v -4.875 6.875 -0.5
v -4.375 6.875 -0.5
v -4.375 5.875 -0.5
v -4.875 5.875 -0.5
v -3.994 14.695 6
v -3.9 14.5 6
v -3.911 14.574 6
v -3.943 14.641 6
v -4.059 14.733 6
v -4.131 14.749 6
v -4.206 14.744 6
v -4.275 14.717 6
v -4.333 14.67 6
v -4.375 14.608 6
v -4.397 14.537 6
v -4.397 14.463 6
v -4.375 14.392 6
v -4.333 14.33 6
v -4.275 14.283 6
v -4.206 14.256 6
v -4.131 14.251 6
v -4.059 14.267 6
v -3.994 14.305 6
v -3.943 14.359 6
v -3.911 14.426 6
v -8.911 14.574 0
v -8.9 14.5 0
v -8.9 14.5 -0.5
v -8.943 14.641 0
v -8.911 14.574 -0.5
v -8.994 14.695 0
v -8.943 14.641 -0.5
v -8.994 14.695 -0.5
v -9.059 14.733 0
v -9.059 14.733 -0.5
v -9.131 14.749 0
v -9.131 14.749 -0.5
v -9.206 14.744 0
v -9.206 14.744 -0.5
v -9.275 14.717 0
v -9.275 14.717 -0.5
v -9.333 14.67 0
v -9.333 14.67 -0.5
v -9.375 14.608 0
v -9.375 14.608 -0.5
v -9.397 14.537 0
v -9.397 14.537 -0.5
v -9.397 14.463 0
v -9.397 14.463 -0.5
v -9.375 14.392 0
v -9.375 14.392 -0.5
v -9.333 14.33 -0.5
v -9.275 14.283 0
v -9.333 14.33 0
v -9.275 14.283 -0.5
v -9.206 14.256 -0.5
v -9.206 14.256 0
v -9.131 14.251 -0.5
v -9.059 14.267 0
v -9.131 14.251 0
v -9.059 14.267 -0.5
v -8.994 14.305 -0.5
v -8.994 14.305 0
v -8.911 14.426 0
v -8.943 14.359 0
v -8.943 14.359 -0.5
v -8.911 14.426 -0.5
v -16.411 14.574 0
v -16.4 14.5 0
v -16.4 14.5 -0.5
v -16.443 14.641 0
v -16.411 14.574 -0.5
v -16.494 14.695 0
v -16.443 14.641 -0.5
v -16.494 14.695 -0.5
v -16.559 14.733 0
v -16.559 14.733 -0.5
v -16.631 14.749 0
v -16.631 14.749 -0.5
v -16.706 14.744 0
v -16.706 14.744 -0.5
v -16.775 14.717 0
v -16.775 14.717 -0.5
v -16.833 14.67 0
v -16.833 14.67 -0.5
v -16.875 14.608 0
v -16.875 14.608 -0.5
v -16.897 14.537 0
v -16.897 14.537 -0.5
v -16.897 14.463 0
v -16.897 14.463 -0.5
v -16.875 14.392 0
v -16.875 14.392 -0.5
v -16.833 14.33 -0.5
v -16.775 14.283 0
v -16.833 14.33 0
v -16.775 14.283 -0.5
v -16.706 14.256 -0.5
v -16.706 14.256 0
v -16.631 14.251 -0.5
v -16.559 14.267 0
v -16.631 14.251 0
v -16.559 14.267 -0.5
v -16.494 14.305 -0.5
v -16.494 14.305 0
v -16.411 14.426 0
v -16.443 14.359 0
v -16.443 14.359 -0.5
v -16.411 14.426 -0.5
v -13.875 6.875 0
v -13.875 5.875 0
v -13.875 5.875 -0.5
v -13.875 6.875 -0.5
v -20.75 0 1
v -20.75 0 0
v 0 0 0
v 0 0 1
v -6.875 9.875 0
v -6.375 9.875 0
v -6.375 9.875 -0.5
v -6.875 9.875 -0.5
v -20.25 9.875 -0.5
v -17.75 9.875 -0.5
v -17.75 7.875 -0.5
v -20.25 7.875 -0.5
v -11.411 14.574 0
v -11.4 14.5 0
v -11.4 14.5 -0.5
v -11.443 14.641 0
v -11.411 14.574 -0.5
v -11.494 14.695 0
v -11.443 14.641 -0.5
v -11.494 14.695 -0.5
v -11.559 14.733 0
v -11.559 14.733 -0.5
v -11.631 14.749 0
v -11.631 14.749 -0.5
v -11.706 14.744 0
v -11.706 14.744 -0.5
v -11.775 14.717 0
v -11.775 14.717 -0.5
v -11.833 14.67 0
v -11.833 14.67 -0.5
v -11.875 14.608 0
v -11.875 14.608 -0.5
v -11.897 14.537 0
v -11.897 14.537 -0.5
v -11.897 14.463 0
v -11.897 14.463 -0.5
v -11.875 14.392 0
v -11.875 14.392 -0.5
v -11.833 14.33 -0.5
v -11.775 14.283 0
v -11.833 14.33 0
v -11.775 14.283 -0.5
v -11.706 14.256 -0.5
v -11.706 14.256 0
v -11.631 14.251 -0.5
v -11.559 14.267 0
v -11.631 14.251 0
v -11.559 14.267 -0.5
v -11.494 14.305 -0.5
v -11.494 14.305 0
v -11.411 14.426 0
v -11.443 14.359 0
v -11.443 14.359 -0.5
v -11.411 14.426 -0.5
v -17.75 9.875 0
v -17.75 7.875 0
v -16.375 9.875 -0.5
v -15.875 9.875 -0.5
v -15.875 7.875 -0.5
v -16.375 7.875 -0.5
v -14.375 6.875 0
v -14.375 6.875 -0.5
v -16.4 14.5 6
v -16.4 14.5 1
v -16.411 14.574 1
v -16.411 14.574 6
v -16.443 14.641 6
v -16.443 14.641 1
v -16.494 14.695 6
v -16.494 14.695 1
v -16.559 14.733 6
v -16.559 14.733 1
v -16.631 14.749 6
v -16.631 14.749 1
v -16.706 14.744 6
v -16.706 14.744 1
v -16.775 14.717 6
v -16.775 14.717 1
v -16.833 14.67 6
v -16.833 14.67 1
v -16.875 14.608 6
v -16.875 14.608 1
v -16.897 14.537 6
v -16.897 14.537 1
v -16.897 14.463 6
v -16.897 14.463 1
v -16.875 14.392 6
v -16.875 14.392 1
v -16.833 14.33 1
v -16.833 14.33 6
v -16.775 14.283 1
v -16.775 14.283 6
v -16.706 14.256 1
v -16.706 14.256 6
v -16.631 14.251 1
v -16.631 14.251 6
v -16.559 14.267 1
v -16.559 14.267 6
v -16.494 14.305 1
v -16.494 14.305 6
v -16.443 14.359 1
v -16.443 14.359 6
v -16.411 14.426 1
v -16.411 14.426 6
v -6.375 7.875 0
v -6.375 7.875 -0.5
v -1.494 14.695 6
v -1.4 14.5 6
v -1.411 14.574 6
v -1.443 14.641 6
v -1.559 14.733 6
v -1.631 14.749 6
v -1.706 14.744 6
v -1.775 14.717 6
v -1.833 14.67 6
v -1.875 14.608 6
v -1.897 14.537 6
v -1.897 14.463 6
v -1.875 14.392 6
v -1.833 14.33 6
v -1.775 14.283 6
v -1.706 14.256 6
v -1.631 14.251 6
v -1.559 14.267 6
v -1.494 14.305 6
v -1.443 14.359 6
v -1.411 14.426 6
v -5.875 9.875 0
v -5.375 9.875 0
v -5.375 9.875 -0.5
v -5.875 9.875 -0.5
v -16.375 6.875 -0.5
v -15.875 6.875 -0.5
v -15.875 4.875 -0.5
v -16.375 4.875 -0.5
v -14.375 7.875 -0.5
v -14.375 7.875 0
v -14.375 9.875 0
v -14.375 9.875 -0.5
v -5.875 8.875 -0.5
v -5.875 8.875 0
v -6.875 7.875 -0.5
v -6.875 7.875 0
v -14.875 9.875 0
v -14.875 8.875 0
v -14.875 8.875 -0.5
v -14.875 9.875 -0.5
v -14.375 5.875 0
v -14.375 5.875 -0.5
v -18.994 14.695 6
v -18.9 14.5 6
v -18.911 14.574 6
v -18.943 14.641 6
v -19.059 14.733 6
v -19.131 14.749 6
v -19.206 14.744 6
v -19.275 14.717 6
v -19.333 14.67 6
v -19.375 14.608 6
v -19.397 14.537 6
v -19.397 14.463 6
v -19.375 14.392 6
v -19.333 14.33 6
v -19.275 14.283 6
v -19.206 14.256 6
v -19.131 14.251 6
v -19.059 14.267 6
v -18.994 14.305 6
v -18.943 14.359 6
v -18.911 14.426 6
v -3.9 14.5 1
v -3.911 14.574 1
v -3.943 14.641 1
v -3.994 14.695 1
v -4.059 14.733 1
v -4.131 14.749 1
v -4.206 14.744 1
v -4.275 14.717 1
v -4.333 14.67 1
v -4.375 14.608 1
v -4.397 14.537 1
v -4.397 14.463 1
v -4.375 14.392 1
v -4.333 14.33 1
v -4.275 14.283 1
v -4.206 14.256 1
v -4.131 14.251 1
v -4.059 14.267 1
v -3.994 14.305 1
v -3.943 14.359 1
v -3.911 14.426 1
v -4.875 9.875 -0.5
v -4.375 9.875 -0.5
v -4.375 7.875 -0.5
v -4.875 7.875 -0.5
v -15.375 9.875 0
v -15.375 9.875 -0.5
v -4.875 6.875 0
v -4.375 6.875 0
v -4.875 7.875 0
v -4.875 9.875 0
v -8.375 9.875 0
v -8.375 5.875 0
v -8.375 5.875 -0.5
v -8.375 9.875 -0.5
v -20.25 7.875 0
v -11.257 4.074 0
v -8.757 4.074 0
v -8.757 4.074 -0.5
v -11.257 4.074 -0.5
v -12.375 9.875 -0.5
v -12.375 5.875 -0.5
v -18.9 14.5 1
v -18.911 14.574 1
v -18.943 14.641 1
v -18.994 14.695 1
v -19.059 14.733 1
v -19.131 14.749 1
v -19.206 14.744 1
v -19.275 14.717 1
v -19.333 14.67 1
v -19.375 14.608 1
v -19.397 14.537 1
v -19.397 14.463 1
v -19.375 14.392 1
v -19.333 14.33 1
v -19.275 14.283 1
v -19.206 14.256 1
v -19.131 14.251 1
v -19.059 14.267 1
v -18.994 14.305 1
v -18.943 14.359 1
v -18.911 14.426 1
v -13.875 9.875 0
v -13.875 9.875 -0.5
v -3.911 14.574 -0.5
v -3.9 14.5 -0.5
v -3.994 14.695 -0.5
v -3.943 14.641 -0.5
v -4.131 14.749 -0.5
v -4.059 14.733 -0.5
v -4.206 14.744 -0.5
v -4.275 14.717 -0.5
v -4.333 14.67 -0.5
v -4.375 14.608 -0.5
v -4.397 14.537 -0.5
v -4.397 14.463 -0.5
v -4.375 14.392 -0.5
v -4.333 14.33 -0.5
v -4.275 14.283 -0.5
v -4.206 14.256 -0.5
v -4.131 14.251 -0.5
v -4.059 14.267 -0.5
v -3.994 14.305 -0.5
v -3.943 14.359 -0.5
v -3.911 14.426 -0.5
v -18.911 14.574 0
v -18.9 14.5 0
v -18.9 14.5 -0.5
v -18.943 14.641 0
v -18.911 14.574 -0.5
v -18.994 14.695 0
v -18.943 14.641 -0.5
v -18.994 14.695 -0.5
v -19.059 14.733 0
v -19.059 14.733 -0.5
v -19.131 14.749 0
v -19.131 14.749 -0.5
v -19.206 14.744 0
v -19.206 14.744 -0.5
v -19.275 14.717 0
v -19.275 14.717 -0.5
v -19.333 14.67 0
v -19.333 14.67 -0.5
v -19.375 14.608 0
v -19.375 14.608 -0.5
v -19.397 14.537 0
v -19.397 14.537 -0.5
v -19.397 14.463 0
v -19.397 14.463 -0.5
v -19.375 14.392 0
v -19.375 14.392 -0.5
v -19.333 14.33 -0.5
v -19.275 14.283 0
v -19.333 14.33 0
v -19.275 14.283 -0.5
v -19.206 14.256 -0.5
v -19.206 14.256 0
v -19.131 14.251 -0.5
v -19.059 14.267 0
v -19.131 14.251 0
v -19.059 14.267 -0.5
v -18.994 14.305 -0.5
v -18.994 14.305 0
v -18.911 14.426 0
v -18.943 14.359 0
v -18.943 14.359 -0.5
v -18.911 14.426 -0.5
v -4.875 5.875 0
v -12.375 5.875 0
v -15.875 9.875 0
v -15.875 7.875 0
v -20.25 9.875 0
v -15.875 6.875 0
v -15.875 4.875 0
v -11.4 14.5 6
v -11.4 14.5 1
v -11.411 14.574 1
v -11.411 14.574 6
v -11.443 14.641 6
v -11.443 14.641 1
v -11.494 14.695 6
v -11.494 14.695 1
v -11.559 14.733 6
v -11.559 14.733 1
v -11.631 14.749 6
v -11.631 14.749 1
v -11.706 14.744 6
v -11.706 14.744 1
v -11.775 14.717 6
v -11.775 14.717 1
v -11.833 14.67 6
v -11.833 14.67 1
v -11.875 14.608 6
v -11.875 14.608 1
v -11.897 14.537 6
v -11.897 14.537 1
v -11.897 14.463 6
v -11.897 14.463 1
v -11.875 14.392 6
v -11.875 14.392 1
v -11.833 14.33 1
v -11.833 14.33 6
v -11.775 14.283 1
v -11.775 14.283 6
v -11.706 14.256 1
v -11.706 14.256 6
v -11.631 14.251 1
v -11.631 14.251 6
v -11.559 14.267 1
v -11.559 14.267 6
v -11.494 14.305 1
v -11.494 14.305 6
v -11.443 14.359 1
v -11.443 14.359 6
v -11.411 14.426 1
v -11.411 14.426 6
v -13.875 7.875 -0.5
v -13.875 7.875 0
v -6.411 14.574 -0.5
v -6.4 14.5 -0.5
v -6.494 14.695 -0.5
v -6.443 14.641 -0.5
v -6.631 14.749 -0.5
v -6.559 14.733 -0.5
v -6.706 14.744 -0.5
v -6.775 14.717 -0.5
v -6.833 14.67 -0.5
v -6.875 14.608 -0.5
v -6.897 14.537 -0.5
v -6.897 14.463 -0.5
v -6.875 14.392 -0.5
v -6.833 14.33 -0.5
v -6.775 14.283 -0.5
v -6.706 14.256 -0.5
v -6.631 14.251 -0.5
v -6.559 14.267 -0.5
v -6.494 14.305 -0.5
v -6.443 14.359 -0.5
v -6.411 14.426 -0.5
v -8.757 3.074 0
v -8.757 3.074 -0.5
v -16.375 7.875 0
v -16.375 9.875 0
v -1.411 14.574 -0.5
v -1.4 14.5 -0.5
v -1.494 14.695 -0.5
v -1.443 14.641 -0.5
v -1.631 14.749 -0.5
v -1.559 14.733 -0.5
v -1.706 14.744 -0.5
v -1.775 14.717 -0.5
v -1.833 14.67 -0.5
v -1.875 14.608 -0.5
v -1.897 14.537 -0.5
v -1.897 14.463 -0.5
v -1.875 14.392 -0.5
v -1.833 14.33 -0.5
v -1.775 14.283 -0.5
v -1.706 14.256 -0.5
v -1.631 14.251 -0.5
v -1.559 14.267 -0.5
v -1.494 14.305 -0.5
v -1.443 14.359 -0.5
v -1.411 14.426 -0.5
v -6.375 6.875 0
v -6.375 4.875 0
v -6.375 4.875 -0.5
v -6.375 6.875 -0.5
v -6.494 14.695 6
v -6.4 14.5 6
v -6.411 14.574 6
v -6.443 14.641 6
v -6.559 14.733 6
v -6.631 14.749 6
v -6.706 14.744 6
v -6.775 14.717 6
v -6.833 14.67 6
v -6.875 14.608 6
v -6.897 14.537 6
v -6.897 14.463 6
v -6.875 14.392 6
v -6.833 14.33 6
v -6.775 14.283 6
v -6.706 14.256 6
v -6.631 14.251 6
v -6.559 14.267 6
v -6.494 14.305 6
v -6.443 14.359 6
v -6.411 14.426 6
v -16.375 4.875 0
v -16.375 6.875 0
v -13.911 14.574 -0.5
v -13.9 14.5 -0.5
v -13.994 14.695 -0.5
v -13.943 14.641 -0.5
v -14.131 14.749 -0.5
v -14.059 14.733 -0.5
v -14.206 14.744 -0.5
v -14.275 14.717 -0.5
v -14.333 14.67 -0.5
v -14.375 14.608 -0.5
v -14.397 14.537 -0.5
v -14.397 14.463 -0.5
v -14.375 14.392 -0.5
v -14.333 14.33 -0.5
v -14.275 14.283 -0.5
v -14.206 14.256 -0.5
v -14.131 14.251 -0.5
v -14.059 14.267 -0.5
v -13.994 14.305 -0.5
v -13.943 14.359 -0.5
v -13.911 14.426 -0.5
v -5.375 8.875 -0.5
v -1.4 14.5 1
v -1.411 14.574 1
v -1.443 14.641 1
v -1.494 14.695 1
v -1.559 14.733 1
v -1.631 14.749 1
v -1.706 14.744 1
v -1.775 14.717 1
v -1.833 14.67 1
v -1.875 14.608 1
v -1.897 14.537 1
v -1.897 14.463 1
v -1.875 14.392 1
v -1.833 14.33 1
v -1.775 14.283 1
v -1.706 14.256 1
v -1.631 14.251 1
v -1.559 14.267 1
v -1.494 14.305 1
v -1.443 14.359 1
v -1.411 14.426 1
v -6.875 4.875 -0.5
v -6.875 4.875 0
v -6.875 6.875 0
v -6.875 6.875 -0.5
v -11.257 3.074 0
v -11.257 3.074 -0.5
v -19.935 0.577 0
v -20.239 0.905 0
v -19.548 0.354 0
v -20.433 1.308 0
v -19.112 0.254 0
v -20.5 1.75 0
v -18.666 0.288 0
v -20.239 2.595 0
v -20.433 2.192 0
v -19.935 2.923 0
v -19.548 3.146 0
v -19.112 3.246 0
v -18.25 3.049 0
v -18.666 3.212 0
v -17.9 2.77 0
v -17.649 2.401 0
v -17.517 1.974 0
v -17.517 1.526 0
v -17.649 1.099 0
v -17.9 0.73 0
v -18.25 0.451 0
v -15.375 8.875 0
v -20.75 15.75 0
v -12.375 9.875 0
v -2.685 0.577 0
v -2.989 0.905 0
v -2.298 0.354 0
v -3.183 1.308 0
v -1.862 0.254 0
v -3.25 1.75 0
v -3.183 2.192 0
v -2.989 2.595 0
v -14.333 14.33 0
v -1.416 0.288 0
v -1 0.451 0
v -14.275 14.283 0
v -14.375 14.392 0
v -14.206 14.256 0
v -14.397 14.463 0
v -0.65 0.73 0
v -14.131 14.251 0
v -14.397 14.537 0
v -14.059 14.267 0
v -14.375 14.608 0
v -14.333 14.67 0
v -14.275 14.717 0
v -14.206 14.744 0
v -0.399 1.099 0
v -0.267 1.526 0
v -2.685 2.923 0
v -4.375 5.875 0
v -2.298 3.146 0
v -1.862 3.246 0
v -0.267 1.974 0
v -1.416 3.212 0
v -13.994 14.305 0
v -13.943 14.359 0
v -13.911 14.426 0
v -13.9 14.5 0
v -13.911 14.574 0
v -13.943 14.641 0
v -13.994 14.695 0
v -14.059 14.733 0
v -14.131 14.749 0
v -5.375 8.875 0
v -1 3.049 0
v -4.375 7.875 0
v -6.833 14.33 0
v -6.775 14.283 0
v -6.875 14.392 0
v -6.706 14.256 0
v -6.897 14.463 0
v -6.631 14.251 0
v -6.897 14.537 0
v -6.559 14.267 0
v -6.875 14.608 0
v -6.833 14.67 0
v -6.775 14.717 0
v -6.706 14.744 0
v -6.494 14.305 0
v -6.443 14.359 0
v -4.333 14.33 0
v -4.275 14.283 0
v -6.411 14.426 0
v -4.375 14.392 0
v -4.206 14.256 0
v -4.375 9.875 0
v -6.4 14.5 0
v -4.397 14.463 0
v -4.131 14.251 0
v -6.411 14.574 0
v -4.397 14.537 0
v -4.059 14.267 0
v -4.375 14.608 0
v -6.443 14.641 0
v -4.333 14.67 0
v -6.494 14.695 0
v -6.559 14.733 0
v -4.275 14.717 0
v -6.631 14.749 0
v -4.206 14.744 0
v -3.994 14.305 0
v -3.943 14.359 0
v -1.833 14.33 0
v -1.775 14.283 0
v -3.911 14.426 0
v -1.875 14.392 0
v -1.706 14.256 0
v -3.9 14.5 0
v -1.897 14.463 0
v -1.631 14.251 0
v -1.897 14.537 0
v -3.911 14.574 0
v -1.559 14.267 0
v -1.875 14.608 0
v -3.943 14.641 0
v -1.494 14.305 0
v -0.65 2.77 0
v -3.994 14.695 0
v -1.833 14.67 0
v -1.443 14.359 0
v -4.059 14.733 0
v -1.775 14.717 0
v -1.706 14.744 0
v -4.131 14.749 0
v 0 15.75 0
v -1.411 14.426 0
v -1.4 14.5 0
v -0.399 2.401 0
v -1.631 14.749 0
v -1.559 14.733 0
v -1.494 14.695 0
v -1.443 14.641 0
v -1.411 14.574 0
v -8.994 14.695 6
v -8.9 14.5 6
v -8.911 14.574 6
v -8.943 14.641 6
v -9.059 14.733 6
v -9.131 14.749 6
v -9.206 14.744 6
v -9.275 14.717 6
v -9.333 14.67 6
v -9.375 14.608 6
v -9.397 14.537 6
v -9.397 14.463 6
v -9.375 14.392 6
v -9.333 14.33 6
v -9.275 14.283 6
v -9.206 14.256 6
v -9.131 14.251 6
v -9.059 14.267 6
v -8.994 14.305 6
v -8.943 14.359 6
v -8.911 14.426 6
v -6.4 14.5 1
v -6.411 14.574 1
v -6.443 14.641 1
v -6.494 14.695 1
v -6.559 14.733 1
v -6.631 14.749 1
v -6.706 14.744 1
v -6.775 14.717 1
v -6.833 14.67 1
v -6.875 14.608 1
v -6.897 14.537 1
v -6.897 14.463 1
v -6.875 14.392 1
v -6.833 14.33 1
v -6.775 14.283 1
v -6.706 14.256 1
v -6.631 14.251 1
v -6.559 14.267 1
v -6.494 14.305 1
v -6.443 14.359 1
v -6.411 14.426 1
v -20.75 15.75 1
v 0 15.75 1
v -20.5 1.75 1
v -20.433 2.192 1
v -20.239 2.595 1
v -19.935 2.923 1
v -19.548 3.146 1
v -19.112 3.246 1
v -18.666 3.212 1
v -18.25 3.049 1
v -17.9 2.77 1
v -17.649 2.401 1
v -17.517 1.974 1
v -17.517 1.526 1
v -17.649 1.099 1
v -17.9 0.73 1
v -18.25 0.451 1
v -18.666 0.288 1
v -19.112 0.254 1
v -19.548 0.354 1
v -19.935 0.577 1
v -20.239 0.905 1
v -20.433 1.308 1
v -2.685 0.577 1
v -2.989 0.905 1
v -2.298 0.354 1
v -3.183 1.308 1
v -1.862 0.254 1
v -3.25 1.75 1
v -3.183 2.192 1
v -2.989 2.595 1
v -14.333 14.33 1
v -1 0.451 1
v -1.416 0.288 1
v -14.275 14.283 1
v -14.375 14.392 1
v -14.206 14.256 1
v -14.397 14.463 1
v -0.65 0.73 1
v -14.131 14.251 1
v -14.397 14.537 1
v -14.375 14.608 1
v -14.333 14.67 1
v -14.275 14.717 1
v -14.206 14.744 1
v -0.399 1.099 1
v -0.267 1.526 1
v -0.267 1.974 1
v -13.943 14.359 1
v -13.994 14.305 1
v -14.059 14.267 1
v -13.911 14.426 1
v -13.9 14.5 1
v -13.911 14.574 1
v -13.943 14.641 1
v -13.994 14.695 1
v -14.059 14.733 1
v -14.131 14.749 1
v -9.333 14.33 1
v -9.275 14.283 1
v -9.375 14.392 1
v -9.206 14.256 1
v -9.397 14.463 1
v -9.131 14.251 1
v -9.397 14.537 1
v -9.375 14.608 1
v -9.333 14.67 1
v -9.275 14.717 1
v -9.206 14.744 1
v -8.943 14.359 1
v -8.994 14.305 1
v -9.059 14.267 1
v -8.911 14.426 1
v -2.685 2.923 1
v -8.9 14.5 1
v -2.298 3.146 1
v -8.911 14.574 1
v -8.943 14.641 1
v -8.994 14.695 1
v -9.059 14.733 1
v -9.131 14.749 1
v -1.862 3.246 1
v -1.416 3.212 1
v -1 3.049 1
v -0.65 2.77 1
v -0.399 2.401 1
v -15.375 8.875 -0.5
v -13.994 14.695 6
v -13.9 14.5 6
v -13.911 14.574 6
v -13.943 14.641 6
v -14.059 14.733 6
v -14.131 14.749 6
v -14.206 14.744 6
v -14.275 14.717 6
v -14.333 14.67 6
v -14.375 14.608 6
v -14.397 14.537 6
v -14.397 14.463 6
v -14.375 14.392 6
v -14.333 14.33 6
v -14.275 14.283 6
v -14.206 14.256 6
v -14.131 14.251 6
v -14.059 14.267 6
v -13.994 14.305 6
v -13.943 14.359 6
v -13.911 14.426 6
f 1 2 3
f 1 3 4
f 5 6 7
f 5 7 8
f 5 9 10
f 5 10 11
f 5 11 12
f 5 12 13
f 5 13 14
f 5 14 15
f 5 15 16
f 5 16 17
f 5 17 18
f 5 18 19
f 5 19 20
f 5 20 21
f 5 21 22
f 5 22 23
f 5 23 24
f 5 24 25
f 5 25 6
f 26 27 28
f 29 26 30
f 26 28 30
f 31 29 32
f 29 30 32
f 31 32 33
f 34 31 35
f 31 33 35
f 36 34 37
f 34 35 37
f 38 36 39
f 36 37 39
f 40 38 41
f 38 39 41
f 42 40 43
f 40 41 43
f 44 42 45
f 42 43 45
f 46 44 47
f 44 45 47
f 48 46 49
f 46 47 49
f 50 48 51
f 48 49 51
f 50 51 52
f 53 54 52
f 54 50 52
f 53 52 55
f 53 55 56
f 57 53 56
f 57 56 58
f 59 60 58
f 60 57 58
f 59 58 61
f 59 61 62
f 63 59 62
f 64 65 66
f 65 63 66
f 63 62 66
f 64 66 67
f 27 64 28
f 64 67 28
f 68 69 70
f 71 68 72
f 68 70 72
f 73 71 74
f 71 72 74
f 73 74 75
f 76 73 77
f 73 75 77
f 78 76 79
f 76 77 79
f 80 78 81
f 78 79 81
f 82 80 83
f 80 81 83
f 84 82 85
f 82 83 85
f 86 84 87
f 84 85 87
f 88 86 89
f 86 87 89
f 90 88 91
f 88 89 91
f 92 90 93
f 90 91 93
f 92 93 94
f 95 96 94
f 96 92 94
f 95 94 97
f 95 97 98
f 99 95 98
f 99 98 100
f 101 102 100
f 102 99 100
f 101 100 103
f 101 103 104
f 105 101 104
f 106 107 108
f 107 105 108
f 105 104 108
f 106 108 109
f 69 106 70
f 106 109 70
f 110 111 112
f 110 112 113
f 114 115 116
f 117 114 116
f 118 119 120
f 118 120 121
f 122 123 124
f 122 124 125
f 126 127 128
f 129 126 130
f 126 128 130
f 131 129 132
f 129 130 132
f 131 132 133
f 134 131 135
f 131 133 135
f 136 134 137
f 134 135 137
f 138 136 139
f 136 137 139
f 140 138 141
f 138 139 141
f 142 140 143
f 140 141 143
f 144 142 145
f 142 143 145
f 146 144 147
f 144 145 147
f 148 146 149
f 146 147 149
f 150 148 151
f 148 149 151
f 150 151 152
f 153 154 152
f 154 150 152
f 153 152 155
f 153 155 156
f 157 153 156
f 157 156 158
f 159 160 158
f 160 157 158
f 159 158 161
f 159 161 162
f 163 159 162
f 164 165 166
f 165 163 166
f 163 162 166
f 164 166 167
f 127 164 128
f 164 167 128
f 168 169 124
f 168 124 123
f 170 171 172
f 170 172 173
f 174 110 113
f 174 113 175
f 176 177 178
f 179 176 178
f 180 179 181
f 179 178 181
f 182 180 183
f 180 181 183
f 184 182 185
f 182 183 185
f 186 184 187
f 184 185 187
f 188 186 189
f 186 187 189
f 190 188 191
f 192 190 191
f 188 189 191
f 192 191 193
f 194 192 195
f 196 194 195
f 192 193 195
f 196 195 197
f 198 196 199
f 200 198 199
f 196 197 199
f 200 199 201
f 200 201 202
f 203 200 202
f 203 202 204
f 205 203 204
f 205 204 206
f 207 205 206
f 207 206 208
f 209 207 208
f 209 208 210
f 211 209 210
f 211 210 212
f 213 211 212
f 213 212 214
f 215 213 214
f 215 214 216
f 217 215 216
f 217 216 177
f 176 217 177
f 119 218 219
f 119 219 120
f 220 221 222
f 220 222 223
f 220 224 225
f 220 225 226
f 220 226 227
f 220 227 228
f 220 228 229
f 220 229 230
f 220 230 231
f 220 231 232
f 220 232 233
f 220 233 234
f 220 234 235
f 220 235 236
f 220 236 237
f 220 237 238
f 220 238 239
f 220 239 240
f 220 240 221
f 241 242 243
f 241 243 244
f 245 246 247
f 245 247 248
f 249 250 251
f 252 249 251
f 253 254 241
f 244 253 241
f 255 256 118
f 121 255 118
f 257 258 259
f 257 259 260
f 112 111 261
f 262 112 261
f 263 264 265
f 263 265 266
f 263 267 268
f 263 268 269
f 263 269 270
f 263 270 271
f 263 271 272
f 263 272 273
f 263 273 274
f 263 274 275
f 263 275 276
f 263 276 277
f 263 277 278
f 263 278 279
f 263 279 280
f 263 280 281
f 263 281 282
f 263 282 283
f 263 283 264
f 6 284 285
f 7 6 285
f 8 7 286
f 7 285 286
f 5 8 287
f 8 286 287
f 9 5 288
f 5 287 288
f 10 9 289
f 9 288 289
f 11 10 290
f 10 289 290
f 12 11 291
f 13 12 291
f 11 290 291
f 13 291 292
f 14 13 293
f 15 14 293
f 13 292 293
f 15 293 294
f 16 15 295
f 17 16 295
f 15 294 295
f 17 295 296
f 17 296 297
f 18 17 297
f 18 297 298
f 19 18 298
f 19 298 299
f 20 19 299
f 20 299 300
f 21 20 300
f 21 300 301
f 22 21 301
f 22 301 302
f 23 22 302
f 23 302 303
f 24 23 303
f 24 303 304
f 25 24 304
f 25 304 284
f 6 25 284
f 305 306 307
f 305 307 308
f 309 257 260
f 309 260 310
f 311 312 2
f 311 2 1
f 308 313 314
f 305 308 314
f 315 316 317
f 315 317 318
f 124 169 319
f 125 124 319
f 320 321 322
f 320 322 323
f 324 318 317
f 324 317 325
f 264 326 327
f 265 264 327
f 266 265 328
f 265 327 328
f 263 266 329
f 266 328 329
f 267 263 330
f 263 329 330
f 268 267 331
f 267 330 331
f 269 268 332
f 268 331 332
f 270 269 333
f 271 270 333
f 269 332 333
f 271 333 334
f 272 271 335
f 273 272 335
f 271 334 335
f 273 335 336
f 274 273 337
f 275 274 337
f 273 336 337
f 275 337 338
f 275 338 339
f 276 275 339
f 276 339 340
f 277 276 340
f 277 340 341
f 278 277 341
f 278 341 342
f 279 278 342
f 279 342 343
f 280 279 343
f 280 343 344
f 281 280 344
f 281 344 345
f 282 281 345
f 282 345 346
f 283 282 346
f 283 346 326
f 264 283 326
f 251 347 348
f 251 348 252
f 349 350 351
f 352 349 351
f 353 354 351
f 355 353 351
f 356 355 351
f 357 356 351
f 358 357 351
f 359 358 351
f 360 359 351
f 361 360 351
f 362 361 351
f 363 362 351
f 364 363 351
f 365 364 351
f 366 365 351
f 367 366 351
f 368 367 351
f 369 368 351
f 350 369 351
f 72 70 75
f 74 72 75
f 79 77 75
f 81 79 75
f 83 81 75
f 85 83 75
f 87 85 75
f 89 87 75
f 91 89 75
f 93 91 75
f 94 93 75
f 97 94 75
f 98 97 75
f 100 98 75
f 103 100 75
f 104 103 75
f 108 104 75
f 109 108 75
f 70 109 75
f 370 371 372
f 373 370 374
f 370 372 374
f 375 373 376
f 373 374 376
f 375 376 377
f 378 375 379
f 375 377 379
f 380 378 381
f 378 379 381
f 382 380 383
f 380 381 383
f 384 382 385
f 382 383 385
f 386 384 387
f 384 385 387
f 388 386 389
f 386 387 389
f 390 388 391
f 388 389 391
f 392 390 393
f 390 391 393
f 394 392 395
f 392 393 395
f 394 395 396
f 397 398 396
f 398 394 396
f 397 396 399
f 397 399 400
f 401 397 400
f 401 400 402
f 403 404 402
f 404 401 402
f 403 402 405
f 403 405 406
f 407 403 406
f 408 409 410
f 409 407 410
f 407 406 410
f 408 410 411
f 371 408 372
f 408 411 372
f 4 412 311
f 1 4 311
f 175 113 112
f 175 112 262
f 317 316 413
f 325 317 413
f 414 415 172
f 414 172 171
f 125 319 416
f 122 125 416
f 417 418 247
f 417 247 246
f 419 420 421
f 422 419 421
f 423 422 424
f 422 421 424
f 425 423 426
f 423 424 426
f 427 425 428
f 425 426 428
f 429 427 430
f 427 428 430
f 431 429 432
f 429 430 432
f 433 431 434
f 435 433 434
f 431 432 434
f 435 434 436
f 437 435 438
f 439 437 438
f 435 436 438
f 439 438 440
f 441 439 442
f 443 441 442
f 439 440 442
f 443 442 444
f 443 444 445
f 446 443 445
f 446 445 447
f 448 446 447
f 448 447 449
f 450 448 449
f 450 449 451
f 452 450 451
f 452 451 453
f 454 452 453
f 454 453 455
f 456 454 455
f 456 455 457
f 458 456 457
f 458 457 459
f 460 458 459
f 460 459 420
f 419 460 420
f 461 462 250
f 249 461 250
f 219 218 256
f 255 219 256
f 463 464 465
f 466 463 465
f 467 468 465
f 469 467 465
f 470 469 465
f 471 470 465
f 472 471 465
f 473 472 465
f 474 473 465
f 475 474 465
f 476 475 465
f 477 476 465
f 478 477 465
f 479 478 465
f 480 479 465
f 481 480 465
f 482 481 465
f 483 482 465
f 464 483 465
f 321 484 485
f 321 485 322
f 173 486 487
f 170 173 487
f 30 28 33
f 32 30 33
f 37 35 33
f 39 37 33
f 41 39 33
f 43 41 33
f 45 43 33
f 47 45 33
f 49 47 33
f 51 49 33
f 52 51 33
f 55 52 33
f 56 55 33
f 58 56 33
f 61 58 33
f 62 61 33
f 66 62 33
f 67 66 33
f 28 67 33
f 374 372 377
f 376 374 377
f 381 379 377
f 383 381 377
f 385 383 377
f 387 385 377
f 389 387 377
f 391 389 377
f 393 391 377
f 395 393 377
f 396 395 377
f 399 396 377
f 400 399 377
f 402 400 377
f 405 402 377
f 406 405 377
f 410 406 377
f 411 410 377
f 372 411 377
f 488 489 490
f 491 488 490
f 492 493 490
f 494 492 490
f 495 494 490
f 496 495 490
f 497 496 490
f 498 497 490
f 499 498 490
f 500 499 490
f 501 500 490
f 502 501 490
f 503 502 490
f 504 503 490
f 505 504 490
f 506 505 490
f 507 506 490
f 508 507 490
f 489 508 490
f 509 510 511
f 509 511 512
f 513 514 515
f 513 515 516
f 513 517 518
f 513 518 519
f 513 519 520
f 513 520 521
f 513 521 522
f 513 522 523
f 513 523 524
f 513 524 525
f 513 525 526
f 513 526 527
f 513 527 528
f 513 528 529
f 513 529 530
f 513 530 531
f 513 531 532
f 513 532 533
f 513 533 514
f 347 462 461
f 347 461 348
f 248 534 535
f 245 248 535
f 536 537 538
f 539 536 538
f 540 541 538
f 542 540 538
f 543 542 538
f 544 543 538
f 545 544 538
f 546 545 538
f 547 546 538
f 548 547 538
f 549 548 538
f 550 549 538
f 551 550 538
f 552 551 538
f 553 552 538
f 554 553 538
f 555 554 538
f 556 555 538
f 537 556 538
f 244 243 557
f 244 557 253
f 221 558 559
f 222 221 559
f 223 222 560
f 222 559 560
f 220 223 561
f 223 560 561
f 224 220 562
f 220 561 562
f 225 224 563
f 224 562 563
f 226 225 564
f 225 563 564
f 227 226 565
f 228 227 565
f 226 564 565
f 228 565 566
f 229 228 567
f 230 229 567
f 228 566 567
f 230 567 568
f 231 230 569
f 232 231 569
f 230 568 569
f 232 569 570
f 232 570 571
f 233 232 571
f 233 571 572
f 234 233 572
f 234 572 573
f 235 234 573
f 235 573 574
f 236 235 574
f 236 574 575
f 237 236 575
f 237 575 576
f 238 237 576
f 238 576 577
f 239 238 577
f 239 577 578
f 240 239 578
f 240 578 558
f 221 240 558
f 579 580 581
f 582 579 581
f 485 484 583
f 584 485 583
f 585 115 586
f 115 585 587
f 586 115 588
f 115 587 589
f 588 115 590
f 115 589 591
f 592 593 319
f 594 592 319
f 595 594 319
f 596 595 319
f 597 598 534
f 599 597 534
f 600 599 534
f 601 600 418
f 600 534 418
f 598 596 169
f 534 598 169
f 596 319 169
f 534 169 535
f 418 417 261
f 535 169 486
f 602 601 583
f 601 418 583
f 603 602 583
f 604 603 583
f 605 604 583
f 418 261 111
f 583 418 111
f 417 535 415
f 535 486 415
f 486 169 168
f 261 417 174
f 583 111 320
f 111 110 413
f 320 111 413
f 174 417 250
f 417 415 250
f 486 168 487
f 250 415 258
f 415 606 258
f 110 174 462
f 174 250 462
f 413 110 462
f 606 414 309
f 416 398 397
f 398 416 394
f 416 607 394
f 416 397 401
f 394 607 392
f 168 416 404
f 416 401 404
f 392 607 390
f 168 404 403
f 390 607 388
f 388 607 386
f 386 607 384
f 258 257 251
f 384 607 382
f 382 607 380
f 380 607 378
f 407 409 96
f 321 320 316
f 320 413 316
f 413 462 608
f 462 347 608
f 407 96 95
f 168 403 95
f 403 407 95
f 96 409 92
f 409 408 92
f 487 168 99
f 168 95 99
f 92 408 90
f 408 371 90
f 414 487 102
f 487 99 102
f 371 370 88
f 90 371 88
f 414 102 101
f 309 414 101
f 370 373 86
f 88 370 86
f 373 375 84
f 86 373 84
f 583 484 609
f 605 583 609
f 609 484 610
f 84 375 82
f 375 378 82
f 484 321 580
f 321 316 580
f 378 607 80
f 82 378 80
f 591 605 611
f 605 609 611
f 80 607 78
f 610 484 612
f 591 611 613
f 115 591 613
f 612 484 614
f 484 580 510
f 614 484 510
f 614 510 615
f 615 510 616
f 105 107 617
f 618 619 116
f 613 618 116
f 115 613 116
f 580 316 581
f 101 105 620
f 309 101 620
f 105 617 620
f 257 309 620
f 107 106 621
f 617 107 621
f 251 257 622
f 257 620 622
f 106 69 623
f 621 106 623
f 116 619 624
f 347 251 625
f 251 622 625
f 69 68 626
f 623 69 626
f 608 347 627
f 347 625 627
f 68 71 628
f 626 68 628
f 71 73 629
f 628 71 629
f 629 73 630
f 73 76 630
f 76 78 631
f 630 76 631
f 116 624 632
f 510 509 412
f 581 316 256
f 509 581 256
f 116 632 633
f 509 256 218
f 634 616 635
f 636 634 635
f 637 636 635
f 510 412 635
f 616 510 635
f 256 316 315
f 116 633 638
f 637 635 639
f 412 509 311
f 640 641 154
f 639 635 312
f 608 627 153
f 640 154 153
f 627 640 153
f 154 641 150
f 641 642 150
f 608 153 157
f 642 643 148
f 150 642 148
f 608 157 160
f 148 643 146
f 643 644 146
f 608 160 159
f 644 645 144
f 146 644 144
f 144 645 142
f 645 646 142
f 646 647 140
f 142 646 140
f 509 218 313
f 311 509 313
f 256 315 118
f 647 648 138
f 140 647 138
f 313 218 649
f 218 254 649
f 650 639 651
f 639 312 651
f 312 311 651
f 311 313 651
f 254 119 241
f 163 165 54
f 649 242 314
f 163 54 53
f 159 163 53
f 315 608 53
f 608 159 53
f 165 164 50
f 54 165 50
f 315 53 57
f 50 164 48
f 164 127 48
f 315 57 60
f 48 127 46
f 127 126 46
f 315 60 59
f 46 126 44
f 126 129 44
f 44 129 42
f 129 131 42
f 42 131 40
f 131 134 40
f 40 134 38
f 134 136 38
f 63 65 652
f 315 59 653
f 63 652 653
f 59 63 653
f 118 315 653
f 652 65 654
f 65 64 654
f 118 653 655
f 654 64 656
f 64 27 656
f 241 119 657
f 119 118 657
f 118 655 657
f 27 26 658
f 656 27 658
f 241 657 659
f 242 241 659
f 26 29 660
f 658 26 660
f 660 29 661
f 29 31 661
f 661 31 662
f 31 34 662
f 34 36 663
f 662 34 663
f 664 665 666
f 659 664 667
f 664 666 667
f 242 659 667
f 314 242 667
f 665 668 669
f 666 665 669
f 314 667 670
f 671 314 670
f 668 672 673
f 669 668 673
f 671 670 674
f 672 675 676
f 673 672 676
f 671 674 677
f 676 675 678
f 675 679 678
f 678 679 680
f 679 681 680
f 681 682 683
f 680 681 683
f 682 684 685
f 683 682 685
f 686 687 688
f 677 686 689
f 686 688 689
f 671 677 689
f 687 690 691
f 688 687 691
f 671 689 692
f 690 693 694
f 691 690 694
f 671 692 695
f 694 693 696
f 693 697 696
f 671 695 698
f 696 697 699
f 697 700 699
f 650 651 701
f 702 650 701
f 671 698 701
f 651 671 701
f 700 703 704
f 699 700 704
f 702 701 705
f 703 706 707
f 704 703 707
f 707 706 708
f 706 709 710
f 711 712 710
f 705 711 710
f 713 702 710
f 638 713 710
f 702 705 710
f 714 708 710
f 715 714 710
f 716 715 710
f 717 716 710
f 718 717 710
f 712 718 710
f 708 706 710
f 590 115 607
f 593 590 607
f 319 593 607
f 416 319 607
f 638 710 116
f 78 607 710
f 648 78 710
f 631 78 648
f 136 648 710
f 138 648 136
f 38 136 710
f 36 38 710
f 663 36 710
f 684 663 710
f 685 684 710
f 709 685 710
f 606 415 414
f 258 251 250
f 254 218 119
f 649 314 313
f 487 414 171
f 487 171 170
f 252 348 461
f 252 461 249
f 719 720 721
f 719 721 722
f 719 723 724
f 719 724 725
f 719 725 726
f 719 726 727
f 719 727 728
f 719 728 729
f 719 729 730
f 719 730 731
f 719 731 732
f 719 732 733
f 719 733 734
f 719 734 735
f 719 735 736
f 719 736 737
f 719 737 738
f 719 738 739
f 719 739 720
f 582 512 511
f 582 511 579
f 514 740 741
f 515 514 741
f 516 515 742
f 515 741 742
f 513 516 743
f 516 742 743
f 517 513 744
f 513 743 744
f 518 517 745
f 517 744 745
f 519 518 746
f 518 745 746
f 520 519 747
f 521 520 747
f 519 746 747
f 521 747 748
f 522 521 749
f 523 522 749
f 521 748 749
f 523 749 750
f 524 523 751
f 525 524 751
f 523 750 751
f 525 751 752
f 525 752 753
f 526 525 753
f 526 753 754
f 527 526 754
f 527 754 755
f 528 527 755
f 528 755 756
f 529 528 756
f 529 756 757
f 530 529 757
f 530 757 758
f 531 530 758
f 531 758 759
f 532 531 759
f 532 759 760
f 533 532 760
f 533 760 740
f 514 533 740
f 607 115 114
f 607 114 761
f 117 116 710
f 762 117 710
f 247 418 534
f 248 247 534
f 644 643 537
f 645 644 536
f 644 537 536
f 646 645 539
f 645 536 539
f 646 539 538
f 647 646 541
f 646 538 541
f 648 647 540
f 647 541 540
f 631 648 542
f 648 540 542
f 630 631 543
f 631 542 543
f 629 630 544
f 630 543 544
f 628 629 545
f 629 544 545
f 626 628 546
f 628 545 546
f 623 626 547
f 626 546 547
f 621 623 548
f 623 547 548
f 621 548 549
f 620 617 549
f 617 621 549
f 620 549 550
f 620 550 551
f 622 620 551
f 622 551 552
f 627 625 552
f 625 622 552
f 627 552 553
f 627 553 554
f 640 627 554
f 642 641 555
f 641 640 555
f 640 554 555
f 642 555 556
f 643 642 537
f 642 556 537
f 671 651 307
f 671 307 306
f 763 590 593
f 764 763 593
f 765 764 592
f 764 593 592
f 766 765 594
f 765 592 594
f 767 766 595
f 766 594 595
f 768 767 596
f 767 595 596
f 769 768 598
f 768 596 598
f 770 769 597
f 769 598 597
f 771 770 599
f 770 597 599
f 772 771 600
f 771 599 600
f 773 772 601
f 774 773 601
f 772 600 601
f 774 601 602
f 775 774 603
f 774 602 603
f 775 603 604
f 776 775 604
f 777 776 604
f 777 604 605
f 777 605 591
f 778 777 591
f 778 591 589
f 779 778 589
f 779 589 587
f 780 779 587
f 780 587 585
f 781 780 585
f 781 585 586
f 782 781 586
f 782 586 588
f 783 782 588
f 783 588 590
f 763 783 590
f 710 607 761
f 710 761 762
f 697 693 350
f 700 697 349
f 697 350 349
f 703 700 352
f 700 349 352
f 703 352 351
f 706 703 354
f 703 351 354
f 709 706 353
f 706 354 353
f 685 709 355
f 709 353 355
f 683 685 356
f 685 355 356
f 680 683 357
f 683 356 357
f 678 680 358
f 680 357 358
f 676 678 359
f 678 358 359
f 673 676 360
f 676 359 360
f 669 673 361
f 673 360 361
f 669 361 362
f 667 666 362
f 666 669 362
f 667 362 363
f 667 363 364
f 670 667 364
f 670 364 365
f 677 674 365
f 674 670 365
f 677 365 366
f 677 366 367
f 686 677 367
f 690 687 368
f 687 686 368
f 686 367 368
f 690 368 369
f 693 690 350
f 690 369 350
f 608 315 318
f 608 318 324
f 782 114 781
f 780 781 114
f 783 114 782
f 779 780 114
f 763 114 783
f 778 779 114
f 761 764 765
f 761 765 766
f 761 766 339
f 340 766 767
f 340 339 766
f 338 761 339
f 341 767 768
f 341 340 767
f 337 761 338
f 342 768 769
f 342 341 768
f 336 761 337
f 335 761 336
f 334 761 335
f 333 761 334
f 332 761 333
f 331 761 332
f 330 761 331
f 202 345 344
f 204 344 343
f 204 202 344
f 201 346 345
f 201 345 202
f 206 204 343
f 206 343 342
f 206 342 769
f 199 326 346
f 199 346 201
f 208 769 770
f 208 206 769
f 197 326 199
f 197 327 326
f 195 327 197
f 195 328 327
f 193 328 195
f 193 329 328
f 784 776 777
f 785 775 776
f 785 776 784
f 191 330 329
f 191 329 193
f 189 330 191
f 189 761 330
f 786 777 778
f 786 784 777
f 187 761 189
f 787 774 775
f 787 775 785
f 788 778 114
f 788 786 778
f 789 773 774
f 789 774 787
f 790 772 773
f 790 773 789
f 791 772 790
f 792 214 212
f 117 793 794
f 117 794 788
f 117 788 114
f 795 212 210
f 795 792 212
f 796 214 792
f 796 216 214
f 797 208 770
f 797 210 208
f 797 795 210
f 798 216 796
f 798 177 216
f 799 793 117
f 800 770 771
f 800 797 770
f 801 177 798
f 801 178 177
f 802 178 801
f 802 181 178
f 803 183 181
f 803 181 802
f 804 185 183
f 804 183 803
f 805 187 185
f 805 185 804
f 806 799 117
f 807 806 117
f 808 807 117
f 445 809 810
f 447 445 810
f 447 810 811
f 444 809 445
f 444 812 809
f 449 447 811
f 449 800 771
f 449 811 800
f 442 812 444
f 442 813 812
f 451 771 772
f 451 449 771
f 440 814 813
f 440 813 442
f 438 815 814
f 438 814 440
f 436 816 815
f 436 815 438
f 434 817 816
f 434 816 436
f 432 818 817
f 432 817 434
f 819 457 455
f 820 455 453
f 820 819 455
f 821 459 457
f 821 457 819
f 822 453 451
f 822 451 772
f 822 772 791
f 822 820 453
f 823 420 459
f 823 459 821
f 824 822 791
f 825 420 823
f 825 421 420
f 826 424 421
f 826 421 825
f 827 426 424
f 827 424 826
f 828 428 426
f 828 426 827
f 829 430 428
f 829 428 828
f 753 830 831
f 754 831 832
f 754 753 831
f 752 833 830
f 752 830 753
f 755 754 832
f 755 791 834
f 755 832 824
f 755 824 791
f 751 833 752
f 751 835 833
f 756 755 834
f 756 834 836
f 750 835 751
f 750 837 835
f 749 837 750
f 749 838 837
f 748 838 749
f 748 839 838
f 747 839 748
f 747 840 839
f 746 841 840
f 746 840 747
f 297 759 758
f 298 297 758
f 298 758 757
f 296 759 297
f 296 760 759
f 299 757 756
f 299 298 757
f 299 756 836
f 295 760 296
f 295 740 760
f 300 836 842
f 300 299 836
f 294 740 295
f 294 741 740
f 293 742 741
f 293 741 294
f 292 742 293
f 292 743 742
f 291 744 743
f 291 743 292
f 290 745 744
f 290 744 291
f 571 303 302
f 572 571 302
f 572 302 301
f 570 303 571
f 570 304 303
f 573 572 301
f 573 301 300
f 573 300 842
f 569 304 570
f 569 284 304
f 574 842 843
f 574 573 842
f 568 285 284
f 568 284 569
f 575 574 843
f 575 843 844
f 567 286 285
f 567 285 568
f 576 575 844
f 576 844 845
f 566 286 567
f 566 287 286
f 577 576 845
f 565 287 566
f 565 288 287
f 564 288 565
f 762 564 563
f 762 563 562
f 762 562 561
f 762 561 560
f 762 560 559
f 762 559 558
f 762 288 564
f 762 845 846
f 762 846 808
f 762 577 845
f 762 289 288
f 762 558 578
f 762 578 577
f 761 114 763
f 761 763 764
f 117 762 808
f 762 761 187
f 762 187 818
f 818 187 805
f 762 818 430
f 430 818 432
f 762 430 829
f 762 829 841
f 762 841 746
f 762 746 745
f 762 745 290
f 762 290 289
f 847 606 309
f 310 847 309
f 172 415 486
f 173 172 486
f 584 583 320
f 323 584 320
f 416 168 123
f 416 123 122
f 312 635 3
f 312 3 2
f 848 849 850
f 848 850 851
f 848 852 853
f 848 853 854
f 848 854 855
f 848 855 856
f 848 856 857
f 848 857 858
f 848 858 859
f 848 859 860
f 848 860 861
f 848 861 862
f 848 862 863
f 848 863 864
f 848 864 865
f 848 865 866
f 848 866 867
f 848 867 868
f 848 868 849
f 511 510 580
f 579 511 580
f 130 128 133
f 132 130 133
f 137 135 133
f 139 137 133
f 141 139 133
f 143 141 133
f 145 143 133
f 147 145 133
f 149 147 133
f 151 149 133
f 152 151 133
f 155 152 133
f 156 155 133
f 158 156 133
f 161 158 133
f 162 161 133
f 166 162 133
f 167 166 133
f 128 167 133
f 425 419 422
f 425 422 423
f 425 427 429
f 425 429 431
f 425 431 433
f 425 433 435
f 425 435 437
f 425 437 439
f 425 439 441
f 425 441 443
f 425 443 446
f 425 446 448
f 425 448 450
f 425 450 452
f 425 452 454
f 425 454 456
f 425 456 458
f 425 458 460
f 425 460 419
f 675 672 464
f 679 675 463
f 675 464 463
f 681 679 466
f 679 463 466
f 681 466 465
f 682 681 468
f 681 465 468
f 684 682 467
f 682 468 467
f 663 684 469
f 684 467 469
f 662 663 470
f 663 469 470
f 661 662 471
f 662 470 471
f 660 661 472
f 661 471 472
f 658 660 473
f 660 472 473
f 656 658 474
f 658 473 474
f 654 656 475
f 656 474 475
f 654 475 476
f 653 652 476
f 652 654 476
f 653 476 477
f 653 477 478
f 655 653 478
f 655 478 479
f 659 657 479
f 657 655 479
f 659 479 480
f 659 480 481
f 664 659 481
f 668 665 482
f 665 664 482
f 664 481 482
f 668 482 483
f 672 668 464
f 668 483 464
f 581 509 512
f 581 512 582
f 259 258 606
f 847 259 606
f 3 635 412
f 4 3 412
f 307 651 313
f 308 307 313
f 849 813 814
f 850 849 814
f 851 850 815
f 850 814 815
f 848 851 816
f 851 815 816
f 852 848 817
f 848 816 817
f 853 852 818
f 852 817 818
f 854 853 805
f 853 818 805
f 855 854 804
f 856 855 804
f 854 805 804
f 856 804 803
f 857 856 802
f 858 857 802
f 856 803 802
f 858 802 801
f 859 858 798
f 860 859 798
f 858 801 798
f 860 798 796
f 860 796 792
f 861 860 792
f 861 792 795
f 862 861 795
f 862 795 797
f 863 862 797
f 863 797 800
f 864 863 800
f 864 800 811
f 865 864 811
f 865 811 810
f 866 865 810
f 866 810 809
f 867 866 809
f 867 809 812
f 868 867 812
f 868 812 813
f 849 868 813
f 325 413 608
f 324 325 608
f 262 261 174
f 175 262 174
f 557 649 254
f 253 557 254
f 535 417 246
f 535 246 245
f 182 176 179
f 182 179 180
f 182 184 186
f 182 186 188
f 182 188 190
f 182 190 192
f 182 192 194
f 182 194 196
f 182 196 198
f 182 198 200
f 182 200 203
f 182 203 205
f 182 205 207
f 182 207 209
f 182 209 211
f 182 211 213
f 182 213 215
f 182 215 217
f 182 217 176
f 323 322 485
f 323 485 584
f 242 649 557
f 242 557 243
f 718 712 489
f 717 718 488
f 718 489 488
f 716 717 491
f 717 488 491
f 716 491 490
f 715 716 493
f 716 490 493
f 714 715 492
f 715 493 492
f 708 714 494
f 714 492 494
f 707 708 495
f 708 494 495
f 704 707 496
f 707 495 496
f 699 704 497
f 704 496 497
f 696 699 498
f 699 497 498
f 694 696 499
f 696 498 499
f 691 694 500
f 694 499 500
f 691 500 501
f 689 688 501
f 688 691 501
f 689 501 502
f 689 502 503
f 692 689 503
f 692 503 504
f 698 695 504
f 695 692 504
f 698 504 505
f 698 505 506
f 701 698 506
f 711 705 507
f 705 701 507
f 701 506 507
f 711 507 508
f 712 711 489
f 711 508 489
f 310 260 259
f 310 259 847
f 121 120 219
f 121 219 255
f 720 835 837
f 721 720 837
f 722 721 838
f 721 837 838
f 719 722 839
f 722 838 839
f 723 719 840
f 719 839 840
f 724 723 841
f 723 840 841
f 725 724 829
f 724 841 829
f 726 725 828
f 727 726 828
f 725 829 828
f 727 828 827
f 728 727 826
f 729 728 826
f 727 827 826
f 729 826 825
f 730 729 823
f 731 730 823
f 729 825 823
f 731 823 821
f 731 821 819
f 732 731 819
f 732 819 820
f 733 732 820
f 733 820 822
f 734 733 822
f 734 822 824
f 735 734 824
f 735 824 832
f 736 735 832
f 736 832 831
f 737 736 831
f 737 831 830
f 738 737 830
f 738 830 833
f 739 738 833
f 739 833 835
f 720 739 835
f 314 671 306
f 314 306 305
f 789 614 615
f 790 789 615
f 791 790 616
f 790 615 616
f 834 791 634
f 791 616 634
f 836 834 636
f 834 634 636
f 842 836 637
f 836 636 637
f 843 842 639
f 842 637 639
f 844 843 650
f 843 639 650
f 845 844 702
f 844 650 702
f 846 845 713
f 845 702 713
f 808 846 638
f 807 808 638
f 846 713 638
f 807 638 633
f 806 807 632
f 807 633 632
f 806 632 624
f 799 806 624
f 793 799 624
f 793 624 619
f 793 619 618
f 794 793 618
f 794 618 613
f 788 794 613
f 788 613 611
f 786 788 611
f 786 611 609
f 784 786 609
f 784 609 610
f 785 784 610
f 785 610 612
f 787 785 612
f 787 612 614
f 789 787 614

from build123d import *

# Parameters (mm, degrees)
ESQUISSE1_W             = 20.75
ESQUISSE1_H             = 15.75
BOSS_EXTRU_1_DEPTH      = 1
ESQUISSE4_W             = 0.5
ESQUISSE4_H             = 2
ESQUISSE4_H_2           = 1
ESQUISSE4_W_2           = 2.5
ESQUISSE4_W_3           = 4
ESQUISSE4_H_3           = 4
BOSS_EXTRU_4_DEPTH      = 0.5
ESQUISSE5_R             = 1.5
ENL_V_MAT_EXTRU_1_DEPTH = 5
ESQUISSE6_W             = 2.5
ESQUISSE6_H             = 2
BOSS_EXTRU_5_DEPTH      = 0.5
BOSS_EXTRU_6_DEPTH      = 5
BOSS_EXTRU_6_DEPTH_BACK = 1.5
ESQUISSE7_R             = 0.25


with BuildPart() as part:
    # Esquisse1 → Boss.-Extru.1 (new body)
    with BuildSketch(Plane.XY):
        with Locations((-10.375, 7.875)):
            Rectangle(ESQUISSE1_W, ESQUISSE1_H)
    extrude(amount=BOSS_EXTRU_1_DEPTH)

    # Esquisse4 → Boss.-Extru.4 (add)
    with BuildSketch(Plane(origin=(0, 0, 0), x_dir=(-1, 0, 0), z_dir=(0, 0, -1))):
        with Locations((6.625, 8.875)):
            Rectangle(ESQUISSE4_W, ESQUISSE4_H)
        with Locations((5.625, 9.375)):
            Rectangle(ESQUISSE4_W, ESQUISSE4_H_2)
        with Locations((4.625, 8.875)):
            Rectangle(ESQUISSE4_W, ESQUISSE4_H)
        with Locations((4.625, 6.375)):
            Rectangle(ESQUISSE4_W, ESQUISSE4_H_2)
        with Locations((6.625, 5.875)):
            Rectangle(ESQUISSE4_W, ESQUISSE4_H)
        with Locations((10.00670855, 3.574144423)):
            Rectangle(ESQUISSE4_W_2, ESQUISSE4_H_2)
        with Locations((10.375, 7.875)):
            Rectangle(ESQUISSE4_W_3, ESQUISSE4_H_3)
        with Locations((14.125, 8.875)):
            Rectangle(ESQUISSE4_W, ESQUISSE4_H)
        with Locations((16.125, 8.875)):
            Rectangle(ESQUISSE4_W, ESQUISSE4_H)
        with Locations((15.125, 9.375)):
            Rectangle(ESQUISSE4_W, ESQUISSE4_H_2)
        with Locations((14.125, 6.375)):
            Rectangle(ESQUISSE4_W, ESQUISSE4_H_2)
        with Locations((16.125, 5.875)):
            Rectangle(ESQUISSE4_W, ESQUISSE4_H)
    extrude(amount=BOSS_EXTRU_4_DEPTH)

    # Esquisse5 → Enlèv. mat.-Extru.1 (cut)
    with BuildSketch(Plane(origin=(0, 0, 0), x_dir=(-1, 0, 0), z_dir=(0, 0, -1))):
        with Locations((1.75, 1.75)):
            Circle(ESQUISSE5_R)
        with Locations((19, 1.75)):
            Circle(ESQUISSE5_R)
    extrude(amount=-ENL_V_MAT_EXTRU_1_DEPTH, mode=Mode.SUBTRACT)

    # Esquisse6 → Boss.-Extru.5 (add)
    with BuildSketch(Plane(origin=(0, 0, 0), x_dir=(-1, 0, 0), z_dir=(0, 0, -1))):
        with Locations((19, 8.875)):
            Rectangle(ESQUISSE6_W, ESQUISSE6_H)
    extrude(amount=BOSS_EXTRU_5_DEPTH)

    # Esquisse7 → Boss.-Extru.6 (add, two sides: drawn at the far end of the back side and taken through both)
    with BuildSketch(Plane.XY.offset(1).offset(-BOSS_EXTRU_6_DEPTH_BACK)):
        with Locations((-19.15, 14.5)):
            Circle(ESQUISSE7_R)
        with Locations((-16.65, 14.5)):
            Circle(ESQUISSE7_R)
        with Locations((-14.15, 14.5)):
            Circle(ESQUISSE7_R)
        with Locations((-11.65, 14.5)):
            Circle(ESQUISSE7_R)
        with Locations((-9.15, 14.5)):
            Circle(ESQUISSE7_R)
        with Locations((-6.65, 14.5)):
            Circle(ESQUISSE7_R)
        with Locations((-4.15, 14.5)):
            Circle(ESQUISSE7_R)
        with Locations((-1.65, 14.5)):
            Circle(ESQUISSE7_R)
    extrude(amount=BOSS_EXTRU_6_DEPTH + BOSS_EXTRU_6_DEPTH_BACK)


solid = part.part
